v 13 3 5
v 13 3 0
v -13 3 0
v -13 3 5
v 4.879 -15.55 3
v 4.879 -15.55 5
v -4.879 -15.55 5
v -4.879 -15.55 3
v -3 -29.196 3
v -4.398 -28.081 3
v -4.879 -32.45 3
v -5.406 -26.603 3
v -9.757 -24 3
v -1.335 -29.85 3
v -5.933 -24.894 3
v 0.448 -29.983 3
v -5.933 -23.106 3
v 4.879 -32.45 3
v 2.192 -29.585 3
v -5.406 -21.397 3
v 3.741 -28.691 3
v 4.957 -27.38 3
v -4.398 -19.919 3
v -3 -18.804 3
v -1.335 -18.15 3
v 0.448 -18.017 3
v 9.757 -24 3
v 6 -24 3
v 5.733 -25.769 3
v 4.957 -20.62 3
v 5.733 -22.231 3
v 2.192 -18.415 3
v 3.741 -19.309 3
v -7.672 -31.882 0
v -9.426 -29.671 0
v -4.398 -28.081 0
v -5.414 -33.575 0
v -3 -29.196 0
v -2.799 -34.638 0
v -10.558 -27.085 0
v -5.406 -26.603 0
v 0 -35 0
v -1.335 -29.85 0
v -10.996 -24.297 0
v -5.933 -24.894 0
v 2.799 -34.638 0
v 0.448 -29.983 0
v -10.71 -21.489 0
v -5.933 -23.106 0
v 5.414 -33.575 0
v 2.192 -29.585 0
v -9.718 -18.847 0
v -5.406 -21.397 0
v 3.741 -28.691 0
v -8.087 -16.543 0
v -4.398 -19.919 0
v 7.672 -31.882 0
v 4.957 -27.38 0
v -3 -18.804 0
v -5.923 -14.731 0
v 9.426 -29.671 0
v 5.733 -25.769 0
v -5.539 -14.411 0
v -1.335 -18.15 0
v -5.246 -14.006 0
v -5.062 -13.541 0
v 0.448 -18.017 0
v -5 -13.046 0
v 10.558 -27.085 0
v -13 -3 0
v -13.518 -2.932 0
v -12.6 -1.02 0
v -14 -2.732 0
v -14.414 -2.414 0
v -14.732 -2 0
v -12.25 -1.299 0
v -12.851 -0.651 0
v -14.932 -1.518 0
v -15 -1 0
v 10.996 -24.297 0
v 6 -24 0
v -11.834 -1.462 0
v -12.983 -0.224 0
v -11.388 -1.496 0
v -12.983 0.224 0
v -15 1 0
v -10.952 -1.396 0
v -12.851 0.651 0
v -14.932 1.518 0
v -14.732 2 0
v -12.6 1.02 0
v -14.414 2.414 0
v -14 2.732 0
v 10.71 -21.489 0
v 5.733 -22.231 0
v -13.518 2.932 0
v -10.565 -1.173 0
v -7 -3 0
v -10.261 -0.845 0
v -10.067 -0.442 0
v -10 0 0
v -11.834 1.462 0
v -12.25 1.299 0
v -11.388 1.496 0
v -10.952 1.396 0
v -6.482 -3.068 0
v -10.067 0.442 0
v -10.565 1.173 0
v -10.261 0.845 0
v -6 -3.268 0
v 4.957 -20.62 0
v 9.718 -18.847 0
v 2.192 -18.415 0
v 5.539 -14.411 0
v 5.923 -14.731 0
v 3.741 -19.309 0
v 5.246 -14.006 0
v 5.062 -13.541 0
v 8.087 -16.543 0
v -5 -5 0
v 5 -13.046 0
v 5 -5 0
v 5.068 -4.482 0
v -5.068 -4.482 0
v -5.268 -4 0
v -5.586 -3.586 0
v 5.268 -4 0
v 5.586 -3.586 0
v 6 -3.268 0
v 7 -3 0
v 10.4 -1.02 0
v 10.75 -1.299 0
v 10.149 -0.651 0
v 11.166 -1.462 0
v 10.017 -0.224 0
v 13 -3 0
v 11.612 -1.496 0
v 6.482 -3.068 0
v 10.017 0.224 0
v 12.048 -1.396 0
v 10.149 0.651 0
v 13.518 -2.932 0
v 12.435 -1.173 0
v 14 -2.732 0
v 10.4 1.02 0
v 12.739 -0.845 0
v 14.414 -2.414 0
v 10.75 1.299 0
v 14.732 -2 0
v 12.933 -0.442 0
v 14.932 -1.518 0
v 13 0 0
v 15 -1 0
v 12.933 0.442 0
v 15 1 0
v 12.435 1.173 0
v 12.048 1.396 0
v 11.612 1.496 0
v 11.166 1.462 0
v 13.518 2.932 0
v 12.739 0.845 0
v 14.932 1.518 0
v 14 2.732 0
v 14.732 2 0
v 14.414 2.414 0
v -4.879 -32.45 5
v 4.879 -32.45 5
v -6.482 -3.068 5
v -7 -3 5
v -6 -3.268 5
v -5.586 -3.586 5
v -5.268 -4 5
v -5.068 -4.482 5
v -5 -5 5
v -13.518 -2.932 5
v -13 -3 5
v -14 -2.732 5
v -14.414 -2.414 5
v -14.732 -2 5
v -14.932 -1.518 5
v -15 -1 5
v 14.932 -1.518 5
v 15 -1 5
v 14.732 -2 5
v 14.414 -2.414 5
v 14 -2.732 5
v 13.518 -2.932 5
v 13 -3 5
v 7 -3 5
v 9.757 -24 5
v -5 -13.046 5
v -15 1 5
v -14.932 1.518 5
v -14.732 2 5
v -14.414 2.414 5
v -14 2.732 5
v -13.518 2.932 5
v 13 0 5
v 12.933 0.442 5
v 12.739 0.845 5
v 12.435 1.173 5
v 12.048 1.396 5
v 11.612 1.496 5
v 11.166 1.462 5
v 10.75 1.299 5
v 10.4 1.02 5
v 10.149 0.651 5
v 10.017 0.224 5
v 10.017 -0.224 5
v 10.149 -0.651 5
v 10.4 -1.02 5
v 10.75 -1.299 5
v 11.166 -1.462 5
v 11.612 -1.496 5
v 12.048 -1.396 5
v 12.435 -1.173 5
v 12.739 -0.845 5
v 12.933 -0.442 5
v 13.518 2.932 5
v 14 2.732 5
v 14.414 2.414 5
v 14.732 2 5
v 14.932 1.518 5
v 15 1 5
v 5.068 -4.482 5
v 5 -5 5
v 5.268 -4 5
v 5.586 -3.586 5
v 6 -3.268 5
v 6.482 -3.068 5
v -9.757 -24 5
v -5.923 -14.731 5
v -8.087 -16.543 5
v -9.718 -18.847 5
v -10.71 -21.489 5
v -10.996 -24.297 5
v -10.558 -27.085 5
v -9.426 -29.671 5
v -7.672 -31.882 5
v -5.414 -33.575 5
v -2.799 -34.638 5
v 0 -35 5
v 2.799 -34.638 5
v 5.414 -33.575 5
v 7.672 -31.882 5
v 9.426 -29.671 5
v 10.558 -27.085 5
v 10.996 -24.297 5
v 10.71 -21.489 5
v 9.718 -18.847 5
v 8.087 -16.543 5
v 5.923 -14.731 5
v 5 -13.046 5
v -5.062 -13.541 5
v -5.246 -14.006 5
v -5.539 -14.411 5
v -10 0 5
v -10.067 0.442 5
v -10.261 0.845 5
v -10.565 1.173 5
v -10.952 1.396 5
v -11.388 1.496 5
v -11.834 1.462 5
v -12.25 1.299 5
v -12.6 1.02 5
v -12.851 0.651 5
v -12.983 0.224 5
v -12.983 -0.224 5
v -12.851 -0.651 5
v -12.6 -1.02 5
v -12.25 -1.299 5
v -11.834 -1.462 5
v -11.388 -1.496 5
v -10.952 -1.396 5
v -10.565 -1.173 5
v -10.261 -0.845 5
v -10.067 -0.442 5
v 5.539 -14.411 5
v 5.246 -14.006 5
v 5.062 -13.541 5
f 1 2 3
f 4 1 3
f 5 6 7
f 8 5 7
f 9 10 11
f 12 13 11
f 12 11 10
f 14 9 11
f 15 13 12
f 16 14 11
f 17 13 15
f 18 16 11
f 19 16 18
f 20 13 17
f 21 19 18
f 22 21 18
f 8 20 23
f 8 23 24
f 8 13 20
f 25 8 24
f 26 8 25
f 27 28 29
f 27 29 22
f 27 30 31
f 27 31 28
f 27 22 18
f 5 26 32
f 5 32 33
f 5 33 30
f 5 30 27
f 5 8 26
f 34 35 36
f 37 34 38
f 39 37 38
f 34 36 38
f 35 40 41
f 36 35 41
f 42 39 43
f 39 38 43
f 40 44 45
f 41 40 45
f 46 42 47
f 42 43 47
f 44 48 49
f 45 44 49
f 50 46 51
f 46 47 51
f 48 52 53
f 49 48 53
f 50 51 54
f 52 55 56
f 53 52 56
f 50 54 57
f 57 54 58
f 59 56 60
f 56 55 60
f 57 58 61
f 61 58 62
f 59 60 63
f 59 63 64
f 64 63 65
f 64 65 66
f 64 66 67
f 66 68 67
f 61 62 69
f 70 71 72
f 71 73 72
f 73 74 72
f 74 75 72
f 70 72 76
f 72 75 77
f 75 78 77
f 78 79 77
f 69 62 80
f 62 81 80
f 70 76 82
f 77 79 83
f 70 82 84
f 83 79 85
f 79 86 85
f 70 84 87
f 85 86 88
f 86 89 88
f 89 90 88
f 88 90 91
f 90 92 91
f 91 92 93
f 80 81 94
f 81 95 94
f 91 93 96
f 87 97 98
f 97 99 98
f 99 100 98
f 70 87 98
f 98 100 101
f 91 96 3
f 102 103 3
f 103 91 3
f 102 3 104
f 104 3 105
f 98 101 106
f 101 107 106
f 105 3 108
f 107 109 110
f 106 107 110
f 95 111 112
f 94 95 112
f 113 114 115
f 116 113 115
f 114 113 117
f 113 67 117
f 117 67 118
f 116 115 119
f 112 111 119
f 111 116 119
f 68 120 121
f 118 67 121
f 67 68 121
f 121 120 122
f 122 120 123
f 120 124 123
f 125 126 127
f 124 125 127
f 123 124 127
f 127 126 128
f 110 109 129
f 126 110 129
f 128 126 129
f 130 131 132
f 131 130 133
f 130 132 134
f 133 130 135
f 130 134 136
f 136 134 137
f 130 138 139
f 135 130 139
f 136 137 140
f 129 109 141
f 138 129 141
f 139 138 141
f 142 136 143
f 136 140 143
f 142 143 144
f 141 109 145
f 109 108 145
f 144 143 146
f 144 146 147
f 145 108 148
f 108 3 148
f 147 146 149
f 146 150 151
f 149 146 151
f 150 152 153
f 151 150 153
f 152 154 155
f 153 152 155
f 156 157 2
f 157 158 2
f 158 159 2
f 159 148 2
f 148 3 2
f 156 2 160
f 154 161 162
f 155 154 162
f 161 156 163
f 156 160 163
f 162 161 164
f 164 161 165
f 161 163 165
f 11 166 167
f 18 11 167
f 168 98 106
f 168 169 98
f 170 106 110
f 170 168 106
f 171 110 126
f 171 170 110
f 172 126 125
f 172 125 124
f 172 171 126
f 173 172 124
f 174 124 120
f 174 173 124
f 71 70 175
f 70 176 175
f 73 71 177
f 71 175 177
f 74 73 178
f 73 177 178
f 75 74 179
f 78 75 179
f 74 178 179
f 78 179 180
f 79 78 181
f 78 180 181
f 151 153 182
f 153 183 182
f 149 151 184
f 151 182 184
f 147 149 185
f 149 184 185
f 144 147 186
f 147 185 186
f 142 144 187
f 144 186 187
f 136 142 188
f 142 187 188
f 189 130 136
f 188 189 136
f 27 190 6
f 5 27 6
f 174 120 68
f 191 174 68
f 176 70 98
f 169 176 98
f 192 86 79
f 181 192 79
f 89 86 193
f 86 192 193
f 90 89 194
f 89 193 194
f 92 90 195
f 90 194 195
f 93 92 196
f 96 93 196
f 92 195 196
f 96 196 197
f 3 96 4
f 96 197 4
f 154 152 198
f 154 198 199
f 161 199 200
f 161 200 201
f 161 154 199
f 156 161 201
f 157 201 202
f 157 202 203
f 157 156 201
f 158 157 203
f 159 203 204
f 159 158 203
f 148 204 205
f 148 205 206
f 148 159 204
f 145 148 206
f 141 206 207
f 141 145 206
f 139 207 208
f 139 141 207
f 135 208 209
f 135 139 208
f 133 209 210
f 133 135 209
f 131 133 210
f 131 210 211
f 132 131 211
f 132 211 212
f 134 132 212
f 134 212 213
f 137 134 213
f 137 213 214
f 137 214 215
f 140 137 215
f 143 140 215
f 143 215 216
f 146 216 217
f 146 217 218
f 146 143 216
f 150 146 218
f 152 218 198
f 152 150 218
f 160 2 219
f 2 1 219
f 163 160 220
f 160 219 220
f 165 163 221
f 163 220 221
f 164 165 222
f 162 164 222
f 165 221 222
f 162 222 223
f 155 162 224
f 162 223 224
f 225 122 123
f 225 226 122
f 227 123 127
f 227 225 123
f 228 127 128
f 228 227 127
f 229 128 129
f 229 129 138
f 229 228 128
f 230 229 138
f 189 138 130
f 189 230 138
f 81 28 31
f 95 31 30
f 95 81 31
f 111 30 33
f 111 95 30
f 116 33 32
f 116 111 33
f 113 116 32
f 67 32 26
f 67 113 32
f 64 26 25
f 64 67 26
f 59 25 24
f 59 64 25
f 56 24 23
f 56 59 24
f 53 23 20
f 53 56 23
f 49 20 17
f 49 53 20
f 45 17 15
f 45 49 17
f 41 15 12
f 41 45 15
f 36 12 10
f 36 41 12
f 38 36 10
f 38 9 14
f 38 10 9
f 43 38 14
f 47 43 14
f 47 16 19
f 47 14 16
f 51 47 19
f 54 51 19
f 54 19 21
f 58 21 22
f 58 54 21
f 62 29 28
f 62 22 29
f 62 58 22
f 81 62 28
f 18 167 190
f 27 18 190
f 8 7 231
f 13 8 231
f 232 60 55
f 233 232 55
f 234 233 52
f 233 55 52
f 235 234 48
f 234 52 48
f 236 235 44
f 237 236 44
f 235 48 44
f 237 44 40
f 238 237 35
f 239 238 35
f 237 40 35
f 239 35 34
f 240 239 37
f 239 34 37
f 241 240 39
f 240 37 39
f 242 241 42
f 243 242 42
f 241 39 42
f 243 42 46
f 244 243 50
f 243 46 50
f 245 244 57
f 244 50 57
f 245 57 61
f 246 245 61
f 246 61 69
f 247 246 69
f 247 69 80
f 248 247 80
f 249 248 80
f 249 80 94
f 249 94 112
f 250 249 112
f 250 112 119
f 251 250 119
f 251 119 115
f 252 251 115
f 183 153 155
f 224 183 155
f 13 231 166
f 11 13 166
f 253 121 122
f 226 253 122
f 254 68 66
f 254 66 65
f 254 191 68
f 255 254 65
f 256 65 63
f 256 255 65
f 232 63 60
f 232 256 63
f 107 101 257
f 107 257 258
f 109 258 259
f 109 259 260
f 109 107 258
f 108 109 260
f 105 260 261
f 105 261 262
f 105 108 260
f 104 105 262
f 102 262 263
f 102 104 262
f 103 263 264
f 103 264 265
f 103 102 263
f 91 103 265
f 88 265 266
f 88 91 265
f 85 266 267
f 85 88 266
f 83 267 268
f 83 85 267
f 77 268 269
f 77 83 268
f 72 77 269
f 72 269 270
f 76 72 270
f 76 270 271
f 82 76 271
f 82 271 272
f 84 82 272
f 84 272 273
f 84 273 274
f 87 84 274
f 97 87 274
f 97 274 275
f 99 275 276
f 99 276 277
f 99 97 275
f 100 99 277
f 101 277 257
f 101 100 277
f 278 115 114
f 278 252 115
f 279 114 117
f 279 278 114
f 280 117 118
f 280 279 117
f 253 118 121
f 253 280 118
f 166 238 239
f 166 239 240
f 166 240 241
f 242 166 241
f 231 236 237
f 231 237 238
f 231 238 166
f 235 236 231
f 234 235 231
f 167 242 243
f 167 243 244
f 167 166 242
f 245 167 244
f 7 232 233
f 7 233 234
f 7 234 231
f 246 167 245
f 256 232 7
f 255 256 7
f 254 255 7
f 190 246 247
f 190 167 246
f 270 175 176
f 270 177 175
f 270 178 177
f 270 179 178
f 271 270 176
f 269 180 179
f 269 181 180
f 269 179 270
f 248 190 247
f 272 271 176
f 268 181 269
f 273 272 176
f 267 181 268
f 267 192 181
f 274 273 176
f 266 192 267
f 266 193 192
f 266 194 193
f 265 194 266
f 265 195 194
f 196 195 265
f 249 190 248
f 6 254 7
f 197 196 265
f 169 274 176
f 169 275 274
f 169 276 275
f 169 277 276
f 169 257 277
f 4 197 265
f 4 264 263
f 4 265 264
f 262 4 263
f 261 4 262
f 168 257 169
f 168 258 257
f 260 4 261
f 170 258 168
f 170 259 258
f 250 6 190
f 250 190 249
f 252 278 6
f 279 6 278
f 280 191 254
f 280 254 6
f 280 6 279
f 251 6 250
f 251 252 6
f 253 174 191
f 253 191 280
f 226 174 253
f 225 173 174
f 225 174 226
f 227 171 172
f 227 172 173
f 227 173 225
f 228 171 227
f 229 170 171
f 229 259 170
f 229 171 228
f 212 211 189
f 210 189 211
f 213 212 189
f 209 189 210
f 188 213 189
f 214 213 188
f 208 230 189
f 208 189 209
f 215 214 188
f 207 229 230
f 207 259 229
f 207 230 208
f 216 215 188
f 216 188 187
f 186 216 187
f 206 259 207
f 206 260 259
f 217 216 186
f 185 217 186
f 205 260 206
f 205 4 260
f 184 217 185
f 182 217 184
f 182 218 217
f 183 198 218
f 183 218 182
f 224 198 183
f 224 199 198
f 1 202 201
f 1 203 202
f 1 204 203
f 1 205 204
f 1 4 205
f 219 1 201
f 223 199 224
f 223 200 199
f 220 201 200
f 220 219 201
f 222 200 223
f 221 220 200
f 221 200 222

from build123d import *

# Parameters (mm, degrees)
SKETCH_R     = 1.5
SKETCH_R_2   = 6
PAD_DEPTH    = 5
POCKET_DEPTH = 2
FILLET_R     = 2


with BuildPart() as part:
    # Sketch → Pad (new body)
    with BuildSketch(Plane.XY):
        with BuildLine():
            Line((-15, -3), (-5, -3))
            Line((-5, -3), (-5, -14.202041))
            ThreePointArc((-5, -14.202041), (0, -35), (5, -14.202041))
            Line((5, -14.202041), (5, -3))
            Line((5, -3), (15, -3))
            Line((15, -3), (15, 3))
            Line((15, 3), (-15, 3))
            Line((-15, 3), (-15, -3))
        make_face()
        with Locations((11.5, 0)):
            Circle(SKETCH_R, mode=Mode.SUBTRACT)
        with Locations((-11.5, 0)):
            Circle(SKETCH_R, mode=Mode.SUBTRACT)
        with Locations((0, -24)):
            Circle(SKETCH_R_2, mode=Mode.SUBTRACT)
    extrude(amount=PAD_DEPTH)

    # Sketch001 → Pocket (cut)
    with BuildSketch(Plane.XY.offset(5)):
        Polygon((4.87861, -32.45), (9.75722, -24), (4.87861, -15.55), (-4.87861, -15.55), (-9.75722, -24), (-4.87861, -32.45), align=None)
    extrude(amount=-POCKET_DEPTH, mode=Mode.SUBTRACT)

    # Fillet
    fillet_edges = [part.edges().sort_by_distance(p)[0] for p in [
        (15, 3, 2.5),
        (15, -3, 2.5),
        (-15, 3, 2.5),
        (-15, -3, 2.5),
        (-5, -3, 2.5),
        (5, -3, 2.5),
        (5, -14.202041, 2.5),
        (-5, -14.202041, 2.5),
    ]]
    fillet(fillet_edges, radius=FILLET_R)


solid = part.part
